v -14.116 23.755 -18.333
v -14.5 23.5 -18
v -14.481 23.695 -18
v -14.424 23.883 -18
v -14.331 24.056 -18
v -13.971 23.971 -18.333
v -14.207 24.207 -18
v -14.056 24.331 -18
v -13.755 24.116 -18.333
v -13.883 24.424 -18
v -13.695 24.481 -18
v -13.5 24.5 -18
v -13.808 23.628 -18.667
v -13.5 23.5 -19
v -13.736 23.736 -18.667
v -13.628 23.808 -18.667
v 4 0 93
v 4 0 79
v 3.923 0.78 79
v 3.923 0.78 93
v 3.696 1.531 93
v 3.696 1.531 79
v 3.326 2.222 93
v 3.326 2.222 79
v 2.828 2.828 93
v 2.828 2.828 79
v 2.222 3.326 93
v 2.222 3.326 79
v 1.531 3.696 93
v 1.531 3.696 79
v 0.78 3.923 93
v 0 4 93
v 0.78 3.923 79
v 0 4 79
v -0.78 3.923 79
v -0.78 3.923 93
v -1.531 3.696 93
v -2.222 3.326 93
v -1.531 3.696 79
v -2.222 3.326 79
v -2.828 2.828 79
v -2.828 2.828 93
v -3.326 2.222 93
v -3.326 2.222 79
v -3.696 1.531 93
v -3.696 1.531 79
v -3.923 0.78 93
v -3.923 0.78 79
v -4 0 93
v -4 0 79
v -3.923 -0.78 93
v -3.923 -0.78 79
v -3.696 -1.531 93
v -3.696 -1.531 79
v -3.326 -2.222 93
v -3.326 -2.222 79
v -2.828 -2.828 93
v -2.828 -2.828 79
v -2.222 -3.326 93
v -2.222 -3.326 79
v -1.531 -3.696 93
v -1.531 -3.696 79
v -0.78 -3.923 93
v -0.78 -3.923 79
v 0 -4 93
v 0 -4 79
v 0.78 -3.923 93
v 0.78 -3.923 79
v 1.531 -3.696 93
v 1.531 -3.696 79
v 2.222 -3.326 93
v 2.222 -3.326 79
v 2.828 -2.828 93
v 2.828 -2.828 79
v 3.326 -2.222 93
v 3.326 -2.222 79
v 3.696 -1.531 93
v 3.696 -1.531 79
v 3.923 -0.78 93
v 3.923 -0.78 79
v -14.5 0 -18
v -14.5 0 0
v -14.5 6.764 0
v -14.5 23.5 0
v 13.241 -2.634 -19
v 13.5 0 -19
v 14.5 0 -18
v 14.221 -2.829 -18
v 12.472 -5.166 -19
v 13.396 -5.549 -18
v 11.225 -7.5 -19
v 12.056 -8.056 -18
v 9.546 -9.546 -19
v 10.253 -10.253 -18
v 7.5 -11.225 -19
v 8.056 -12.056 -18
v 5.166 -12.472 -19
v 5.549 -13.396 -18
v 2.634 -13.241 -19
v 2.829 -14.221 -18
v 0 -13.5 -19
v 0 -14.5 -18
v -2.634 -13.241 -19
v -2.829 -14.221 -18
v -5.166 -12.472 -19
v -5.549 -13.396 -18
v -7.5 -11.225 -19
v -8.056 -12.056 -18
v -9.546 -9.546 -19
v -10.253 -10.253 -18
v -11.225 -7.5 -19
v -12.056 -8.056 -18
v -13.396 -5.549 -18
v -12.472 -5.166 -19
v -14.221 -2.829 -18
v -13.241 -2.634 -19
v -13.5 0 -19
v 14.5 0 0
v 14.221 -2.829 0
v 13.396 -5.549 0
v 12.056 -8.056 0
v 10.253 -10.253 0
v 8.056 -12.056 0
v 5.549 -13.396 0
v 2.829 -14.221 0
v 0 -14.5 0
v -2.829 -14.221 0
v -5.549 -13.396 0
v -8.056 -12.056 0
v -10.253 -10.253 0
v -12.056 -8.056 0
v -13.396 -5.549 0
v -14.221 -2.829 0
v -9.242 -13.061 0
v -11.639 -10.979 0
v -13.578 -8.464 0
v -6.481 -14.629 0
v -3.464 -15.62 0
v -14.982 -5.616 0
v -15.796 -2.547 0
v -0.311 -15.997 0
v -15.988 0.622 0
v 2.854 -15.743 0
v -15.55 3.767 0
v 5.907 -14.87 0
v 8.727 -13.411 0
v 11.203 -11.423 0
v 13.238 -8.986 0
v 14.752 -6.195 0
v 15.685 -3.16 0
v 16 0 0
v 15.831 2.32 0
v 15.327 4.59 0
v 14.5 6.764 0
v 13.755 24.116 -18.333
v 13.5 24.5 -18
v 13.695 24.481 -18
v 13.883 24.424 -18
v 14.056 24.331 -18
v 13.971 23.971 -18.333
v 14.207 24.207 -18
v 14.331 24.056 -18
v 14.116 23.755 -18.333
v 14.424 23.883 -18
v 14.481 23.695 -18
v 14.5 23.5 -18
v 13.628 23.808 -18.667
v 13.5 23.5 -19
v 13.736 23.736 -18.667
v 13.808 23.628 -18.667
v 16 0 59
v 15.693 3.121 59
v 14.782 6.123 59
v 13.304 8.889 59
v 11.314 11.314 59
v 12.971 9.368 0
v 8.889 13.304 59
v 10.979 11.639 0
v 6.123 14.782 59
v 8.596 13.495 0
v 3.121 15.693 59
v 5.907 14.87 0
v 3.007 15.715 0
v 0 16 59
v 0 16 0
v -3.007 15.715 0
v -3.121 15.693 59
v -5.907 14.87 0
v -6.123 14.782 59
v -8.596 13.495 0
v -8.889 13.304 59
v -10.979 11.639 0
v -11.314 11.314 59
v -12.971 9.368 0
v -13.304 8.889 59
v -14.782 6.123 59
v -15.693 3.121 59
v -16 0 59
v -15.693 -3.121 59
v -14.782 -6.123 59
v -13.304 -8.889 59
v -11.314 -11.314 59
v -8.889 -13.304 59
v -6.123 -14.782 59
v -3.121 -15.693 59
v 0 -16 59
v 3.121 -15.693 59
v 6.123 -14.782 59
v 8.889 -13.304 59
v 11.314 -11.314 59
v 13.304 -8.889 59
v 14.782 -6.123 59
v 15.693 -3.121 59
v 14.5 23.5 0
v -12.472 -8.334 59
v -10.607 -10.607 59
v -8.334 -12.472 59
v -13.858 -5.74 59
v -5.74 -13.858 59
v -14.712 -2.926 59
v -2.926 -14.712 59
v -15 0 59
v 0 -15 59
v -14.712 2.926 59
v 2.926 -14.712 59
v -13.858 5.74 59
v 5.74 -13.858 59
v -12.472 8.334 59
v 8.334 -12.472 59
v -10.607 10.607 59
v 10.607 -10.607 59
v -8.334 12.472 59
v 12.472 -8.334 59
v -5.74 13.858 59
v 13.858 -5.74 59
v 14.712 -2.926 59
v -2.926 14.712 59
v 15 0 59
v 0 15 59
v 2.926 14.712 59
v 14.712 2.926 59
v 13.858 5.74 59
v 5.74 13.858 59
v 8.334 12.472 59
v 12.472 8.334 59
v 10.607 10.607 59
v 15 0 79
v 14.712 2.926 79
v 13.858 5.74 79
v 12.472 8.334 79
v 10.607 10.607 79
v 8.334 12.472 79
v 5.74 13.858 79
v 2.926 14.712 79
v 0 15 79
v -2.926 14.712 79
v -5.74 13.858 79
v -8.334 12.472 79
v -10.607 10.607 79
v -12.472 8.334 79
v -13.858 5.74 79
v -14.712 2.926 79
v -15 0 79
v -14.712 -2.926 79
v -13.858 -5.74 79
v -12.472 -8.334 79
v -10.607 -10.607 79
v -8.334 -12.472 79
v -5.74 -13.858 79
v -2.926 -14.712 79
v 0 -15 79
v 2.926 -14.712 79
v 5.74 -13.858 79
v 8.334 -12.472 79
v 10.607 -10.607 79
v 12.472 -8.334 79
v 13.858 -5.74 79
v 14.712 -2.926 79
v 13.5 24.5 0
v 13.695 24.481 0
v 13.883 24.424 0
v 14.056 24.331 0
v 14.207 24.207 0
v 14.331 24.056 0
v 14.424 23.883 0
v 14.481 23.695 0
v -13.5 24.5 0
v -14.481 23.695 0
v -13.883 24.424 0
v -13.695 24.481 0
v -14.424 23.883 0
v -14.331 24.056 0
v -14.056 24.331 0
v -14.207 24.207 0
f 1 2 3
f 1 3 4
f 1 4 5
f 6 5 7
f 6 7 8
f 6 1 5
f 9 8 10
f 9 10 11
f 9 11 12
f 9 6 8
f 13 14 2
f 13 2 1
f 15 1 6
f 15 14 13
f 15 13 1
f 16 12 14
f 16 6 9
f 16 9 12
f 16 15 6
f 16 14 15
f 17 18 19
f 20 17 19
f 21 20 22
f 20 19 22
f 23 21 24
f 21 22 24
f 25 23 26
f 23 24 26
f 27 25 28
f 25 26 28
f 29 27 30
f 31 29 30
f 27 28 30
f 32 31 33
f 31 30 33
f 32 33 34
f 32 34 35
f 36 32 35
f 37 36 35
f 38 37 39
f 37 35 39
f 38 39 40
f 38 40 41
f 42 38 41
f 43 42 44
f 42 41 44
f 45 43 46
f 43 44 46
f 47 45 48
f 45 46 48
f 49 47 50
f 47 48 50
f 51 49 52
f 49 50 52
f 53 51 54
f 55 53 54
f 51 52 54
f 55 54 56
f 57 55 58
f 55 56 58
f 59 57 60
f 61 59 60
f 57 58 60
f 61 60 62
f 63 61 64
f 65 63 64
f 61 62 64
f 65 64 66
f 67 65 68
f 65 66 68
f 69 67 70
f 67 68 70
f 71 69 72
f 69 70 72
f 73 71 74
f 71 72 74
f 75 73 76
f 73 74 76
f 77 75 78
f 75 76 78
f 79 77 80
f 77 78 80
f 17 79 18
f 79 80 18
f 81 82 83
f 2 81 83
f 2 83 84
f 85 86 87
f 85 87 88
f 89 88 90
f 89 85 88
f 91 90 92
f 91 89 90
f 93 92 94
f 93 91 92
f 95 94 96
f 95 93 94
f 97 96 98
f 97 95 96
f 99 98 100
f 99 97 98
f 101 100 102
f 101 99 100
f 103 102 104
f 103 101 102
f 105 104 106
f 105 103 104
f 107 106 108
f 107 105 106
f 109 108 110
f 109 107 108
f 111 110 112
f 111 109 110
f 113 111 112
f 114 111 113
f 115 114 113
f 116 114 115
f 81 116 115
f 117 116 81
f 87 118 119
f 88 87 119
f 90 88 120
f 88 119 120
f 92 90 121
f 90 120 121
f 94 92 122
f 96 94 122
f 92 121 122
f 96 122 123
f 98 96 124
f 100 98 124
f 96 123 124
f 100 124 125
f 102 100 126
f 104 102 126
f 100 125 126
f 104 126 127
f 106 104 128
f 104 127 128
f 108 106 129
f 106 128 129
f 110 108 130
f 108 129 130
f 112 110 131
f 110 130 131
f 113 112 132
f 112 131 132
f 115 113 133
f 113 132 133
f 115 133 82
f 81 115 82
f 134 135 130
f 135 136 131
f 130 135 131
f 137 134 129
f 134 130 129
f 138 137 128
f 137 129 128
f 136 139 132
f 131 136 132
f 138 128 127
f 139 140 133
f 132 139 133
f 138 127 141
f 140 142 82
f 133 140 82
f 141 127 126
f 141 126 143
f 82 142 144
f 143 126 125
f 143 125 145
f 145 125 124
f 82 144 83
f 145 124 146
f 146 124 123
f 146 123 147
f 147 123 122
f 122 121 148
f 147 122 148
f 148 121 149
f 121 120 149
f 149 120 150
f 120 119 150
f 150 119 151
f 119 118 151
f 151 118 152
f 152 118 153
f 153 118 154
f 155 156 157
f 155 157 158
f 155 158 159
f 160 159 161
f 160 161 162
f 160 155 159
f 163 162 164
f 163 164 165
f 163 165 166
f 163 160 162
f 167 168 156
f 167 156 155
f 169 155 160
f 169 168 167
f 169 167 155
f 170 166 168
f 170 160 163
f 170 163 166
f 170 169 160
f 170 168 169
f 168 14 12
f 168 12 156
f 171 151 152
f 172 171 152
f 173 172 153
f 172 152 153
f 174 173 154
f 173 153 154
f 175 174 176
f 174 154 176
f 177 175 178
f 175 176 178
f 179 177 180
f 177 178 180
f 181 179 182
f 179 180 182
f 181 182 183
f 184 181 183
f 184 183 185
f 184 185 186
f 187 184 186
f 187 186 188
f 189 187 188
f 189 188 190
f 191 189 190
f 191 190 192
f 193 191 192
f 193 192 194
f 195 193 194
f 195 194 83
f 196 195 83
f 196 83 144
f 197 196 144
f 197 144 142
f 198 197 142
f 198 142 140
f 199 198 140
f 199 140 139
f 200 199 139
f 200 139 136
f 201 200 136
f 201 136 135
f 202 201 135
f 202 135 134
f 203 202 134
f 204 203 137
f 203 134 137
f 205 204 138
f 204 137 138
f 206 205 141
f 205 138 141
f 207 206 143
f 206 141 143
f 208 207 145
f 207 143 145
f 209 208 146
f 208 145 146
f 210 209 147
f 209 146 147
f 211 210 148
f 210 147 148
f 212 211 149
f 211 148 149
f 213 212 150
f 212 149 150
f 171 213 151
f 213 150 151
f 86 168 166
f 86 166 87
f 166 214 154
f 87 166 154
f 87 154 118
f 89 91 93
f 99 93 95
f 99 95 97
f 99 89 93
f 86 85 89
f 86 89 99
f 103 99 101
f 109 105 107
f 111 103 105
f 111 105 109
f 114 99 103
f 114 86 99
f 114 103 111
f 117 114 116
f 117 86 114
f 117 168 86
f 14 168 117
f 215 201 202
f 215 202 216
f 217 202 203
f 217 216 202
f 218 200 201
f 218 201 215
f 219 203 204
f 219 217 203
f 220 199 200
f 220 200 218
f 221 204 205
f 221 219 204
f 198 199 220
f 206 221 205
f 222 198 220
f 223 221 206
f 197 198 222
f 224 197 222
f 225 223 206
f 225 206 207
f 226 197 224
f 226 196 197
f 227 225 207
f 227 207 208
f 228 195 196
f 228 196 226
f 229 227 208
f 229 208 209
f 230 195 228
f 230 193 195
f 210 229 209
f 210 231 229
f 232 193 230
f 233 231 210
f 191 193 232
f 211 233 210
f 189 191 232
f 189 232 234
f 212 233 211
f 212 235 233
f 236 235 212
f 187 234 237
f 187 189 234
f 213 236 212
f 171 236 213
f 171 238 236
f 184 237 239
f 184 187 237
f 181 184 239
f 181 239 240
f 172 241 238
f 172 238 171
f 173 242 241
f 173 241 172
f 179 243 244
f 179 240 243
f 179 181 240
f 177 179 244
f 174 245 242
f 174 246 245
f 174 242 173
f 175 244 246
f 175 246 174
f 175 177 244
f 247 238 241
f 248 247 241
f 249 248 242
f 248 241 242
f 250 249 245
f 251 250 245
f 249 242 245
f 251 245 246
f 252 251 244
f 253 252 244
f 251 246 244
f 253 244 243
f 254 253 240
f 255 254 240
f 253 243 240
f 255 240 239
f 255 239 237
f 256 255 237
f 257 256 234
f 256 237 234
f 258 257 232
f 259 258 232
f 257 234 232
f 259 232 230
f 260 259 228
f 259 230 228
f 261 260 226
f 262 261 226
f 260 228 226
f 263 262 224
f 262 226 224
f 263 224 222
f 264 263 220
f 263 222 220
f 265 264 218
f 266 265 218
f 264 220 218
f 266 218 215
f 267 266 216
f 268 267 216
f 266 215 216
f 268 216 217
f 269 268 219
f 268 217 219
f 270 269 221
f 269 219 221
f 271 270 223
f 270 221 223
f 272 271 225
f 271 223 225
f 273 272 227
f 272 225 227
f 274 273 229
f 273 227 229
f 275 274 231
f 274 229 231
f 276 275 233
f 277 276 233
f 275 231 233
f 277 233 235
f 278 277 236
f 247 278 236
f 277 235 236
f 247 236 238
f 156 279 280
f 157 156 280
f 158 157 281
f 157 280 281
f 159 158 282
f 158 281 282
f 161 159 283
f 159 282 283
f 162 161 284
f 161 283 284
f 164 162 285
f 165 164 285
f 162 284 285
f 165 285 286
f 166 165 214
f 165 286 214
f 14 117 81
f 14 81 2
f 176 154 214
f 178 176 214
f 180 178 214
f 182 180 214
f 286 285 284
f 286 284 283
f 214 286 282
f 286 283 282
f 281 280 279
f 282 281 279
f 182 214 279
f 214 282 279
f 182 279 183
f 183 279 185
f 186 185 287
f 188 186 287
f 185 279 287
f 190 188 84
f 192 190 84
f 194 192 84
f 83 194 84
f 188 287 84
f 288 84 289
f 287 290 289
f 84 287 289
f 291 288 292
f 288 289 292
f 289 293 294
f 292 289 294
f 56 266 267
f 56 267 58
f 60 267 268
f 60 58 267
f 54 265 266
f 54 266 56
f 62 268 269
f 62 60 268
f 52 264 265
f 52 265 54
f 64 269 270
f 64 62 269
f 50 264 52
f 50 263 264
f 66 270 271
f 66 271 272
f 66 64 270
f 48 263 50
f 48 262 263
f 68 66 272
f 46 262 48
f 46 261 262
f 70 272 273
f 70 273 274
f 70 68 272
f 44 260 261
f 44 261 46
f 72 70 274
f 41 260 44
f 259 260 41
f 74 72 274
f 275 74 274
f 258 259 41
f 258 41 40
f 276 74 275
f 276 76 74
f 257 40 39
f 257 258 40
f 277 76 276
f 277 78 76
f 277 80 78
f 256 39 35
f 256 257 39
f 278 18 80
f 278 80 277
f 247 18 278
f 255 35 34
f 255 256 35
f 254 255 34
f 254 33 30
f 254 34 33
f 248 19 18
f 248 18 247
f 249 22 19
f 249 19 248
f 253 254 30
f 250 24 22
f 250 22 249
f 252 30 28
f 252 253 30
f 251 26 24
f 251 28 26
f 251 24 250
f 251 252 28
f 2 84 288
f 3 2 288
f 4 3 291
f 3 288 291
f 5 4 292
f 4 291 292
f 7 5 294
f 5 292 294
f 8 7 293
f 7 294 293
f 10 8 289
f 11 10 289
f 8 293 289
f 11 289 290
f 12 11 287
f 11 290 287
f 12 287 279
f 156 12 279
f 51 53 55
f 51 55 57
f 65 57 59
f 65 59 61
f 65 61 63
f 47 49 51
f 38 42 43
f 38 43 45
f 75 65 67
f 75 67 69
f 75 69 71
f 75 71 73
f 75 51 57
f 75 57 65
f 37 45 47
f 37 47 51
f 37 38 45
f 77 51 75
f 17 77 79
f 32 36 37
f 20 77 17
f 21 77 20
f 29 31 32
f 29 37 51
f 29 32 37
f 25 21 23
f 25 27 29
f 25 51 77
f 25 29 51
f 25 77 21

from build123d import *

# Parameters (mm, degrees)
SKETCH_1_R          = 16
EXTRUDE_1_DEPTH     = 79
SKETCH_2_R          = 4
EXTRUDE_2_DEPTH     = 14
CUT_EXTRUDE_START   = -20
SKETCH_3_R          = 16
SKETCH_3_R_2        = 15
CUT_EXTRUDE_1_DEPTH = 20
EXTRUDE_3_DEPTH     = 19
CHAMFER_1_SIZE      = 1


with BuildPart() as part:
    # 草圖1 → 填料-伸長1 (new body)
    with BuildSketch(Plane.XY):
        Circle(SKETCH_1_R)
    extrude(amount=EXTRUDE_1_DEPTH)

    # 草圖2 → 填料-伸長2 (add)
    with BuildSketch(Plane.XY.offset(79)):
        Circle(SKETCH_2_R)
    extrude(amount=EXTRUDE_2_DEPTH)

    # 草圖3 → 除料-伸長1 (cut)
    with BuildSketch(Plane.XY.offset(79).offset(CUT_EXTRUDE_START)):
        Circle(SKETCH_3_R)
        Circle(SKETCH_3_R_2, mode=Mode.SUBTRACT)
    extrude(amount=CUT_EXTRUDE_1_DEPTH, mode=Mode.SUBTRACT)

    # 草圖4 → 填料-伸長3 (add)
    with BuildSketch(Plane(origin=(0, 0, 0), x_dir=(-1, 0, 0), z_dir=(0, 0, -1))):
        with BuildLine():
            Line((14.5, 0), (14.5, 23.5))
            ThreePointArc((14.5, 23.5), (14.207106781, 24.207106781), (13.5, 24.5))
            Line((13.5, 24.5), (-13.5, 24.5))
            ThreePointArc((-13.5, 24.5), (-14.207106781, 24.207106781), (-14.5, 23.5))
            Line((-14.5, 23.5), (-14.5, 0))
            ThreePointArc((-14.5, 0), (0, -14.5), (14.5, 0))
        make_face()
    extrude(amount=EXTRUDE_3_DEPTH)

    # 導角1
    chamfer_1_edges = [part.edges().sort_by_distance(p)[0] for p in [
        (0, -14.5, -19),
        (-14.5, 11.75, -19),
        (-14.207106781, 24.207106781, -19),
        (0, 24.5, -19),
        (14.207106781, 24.207106781, -19),
        (14.5, 11.75, -19),
    ]]
    chamfer(chamfer_1_edges, length=CHAMFER_1_SIZE - 0.0001)  # a hair under: the kernel refuses the full size


solid = part.part
